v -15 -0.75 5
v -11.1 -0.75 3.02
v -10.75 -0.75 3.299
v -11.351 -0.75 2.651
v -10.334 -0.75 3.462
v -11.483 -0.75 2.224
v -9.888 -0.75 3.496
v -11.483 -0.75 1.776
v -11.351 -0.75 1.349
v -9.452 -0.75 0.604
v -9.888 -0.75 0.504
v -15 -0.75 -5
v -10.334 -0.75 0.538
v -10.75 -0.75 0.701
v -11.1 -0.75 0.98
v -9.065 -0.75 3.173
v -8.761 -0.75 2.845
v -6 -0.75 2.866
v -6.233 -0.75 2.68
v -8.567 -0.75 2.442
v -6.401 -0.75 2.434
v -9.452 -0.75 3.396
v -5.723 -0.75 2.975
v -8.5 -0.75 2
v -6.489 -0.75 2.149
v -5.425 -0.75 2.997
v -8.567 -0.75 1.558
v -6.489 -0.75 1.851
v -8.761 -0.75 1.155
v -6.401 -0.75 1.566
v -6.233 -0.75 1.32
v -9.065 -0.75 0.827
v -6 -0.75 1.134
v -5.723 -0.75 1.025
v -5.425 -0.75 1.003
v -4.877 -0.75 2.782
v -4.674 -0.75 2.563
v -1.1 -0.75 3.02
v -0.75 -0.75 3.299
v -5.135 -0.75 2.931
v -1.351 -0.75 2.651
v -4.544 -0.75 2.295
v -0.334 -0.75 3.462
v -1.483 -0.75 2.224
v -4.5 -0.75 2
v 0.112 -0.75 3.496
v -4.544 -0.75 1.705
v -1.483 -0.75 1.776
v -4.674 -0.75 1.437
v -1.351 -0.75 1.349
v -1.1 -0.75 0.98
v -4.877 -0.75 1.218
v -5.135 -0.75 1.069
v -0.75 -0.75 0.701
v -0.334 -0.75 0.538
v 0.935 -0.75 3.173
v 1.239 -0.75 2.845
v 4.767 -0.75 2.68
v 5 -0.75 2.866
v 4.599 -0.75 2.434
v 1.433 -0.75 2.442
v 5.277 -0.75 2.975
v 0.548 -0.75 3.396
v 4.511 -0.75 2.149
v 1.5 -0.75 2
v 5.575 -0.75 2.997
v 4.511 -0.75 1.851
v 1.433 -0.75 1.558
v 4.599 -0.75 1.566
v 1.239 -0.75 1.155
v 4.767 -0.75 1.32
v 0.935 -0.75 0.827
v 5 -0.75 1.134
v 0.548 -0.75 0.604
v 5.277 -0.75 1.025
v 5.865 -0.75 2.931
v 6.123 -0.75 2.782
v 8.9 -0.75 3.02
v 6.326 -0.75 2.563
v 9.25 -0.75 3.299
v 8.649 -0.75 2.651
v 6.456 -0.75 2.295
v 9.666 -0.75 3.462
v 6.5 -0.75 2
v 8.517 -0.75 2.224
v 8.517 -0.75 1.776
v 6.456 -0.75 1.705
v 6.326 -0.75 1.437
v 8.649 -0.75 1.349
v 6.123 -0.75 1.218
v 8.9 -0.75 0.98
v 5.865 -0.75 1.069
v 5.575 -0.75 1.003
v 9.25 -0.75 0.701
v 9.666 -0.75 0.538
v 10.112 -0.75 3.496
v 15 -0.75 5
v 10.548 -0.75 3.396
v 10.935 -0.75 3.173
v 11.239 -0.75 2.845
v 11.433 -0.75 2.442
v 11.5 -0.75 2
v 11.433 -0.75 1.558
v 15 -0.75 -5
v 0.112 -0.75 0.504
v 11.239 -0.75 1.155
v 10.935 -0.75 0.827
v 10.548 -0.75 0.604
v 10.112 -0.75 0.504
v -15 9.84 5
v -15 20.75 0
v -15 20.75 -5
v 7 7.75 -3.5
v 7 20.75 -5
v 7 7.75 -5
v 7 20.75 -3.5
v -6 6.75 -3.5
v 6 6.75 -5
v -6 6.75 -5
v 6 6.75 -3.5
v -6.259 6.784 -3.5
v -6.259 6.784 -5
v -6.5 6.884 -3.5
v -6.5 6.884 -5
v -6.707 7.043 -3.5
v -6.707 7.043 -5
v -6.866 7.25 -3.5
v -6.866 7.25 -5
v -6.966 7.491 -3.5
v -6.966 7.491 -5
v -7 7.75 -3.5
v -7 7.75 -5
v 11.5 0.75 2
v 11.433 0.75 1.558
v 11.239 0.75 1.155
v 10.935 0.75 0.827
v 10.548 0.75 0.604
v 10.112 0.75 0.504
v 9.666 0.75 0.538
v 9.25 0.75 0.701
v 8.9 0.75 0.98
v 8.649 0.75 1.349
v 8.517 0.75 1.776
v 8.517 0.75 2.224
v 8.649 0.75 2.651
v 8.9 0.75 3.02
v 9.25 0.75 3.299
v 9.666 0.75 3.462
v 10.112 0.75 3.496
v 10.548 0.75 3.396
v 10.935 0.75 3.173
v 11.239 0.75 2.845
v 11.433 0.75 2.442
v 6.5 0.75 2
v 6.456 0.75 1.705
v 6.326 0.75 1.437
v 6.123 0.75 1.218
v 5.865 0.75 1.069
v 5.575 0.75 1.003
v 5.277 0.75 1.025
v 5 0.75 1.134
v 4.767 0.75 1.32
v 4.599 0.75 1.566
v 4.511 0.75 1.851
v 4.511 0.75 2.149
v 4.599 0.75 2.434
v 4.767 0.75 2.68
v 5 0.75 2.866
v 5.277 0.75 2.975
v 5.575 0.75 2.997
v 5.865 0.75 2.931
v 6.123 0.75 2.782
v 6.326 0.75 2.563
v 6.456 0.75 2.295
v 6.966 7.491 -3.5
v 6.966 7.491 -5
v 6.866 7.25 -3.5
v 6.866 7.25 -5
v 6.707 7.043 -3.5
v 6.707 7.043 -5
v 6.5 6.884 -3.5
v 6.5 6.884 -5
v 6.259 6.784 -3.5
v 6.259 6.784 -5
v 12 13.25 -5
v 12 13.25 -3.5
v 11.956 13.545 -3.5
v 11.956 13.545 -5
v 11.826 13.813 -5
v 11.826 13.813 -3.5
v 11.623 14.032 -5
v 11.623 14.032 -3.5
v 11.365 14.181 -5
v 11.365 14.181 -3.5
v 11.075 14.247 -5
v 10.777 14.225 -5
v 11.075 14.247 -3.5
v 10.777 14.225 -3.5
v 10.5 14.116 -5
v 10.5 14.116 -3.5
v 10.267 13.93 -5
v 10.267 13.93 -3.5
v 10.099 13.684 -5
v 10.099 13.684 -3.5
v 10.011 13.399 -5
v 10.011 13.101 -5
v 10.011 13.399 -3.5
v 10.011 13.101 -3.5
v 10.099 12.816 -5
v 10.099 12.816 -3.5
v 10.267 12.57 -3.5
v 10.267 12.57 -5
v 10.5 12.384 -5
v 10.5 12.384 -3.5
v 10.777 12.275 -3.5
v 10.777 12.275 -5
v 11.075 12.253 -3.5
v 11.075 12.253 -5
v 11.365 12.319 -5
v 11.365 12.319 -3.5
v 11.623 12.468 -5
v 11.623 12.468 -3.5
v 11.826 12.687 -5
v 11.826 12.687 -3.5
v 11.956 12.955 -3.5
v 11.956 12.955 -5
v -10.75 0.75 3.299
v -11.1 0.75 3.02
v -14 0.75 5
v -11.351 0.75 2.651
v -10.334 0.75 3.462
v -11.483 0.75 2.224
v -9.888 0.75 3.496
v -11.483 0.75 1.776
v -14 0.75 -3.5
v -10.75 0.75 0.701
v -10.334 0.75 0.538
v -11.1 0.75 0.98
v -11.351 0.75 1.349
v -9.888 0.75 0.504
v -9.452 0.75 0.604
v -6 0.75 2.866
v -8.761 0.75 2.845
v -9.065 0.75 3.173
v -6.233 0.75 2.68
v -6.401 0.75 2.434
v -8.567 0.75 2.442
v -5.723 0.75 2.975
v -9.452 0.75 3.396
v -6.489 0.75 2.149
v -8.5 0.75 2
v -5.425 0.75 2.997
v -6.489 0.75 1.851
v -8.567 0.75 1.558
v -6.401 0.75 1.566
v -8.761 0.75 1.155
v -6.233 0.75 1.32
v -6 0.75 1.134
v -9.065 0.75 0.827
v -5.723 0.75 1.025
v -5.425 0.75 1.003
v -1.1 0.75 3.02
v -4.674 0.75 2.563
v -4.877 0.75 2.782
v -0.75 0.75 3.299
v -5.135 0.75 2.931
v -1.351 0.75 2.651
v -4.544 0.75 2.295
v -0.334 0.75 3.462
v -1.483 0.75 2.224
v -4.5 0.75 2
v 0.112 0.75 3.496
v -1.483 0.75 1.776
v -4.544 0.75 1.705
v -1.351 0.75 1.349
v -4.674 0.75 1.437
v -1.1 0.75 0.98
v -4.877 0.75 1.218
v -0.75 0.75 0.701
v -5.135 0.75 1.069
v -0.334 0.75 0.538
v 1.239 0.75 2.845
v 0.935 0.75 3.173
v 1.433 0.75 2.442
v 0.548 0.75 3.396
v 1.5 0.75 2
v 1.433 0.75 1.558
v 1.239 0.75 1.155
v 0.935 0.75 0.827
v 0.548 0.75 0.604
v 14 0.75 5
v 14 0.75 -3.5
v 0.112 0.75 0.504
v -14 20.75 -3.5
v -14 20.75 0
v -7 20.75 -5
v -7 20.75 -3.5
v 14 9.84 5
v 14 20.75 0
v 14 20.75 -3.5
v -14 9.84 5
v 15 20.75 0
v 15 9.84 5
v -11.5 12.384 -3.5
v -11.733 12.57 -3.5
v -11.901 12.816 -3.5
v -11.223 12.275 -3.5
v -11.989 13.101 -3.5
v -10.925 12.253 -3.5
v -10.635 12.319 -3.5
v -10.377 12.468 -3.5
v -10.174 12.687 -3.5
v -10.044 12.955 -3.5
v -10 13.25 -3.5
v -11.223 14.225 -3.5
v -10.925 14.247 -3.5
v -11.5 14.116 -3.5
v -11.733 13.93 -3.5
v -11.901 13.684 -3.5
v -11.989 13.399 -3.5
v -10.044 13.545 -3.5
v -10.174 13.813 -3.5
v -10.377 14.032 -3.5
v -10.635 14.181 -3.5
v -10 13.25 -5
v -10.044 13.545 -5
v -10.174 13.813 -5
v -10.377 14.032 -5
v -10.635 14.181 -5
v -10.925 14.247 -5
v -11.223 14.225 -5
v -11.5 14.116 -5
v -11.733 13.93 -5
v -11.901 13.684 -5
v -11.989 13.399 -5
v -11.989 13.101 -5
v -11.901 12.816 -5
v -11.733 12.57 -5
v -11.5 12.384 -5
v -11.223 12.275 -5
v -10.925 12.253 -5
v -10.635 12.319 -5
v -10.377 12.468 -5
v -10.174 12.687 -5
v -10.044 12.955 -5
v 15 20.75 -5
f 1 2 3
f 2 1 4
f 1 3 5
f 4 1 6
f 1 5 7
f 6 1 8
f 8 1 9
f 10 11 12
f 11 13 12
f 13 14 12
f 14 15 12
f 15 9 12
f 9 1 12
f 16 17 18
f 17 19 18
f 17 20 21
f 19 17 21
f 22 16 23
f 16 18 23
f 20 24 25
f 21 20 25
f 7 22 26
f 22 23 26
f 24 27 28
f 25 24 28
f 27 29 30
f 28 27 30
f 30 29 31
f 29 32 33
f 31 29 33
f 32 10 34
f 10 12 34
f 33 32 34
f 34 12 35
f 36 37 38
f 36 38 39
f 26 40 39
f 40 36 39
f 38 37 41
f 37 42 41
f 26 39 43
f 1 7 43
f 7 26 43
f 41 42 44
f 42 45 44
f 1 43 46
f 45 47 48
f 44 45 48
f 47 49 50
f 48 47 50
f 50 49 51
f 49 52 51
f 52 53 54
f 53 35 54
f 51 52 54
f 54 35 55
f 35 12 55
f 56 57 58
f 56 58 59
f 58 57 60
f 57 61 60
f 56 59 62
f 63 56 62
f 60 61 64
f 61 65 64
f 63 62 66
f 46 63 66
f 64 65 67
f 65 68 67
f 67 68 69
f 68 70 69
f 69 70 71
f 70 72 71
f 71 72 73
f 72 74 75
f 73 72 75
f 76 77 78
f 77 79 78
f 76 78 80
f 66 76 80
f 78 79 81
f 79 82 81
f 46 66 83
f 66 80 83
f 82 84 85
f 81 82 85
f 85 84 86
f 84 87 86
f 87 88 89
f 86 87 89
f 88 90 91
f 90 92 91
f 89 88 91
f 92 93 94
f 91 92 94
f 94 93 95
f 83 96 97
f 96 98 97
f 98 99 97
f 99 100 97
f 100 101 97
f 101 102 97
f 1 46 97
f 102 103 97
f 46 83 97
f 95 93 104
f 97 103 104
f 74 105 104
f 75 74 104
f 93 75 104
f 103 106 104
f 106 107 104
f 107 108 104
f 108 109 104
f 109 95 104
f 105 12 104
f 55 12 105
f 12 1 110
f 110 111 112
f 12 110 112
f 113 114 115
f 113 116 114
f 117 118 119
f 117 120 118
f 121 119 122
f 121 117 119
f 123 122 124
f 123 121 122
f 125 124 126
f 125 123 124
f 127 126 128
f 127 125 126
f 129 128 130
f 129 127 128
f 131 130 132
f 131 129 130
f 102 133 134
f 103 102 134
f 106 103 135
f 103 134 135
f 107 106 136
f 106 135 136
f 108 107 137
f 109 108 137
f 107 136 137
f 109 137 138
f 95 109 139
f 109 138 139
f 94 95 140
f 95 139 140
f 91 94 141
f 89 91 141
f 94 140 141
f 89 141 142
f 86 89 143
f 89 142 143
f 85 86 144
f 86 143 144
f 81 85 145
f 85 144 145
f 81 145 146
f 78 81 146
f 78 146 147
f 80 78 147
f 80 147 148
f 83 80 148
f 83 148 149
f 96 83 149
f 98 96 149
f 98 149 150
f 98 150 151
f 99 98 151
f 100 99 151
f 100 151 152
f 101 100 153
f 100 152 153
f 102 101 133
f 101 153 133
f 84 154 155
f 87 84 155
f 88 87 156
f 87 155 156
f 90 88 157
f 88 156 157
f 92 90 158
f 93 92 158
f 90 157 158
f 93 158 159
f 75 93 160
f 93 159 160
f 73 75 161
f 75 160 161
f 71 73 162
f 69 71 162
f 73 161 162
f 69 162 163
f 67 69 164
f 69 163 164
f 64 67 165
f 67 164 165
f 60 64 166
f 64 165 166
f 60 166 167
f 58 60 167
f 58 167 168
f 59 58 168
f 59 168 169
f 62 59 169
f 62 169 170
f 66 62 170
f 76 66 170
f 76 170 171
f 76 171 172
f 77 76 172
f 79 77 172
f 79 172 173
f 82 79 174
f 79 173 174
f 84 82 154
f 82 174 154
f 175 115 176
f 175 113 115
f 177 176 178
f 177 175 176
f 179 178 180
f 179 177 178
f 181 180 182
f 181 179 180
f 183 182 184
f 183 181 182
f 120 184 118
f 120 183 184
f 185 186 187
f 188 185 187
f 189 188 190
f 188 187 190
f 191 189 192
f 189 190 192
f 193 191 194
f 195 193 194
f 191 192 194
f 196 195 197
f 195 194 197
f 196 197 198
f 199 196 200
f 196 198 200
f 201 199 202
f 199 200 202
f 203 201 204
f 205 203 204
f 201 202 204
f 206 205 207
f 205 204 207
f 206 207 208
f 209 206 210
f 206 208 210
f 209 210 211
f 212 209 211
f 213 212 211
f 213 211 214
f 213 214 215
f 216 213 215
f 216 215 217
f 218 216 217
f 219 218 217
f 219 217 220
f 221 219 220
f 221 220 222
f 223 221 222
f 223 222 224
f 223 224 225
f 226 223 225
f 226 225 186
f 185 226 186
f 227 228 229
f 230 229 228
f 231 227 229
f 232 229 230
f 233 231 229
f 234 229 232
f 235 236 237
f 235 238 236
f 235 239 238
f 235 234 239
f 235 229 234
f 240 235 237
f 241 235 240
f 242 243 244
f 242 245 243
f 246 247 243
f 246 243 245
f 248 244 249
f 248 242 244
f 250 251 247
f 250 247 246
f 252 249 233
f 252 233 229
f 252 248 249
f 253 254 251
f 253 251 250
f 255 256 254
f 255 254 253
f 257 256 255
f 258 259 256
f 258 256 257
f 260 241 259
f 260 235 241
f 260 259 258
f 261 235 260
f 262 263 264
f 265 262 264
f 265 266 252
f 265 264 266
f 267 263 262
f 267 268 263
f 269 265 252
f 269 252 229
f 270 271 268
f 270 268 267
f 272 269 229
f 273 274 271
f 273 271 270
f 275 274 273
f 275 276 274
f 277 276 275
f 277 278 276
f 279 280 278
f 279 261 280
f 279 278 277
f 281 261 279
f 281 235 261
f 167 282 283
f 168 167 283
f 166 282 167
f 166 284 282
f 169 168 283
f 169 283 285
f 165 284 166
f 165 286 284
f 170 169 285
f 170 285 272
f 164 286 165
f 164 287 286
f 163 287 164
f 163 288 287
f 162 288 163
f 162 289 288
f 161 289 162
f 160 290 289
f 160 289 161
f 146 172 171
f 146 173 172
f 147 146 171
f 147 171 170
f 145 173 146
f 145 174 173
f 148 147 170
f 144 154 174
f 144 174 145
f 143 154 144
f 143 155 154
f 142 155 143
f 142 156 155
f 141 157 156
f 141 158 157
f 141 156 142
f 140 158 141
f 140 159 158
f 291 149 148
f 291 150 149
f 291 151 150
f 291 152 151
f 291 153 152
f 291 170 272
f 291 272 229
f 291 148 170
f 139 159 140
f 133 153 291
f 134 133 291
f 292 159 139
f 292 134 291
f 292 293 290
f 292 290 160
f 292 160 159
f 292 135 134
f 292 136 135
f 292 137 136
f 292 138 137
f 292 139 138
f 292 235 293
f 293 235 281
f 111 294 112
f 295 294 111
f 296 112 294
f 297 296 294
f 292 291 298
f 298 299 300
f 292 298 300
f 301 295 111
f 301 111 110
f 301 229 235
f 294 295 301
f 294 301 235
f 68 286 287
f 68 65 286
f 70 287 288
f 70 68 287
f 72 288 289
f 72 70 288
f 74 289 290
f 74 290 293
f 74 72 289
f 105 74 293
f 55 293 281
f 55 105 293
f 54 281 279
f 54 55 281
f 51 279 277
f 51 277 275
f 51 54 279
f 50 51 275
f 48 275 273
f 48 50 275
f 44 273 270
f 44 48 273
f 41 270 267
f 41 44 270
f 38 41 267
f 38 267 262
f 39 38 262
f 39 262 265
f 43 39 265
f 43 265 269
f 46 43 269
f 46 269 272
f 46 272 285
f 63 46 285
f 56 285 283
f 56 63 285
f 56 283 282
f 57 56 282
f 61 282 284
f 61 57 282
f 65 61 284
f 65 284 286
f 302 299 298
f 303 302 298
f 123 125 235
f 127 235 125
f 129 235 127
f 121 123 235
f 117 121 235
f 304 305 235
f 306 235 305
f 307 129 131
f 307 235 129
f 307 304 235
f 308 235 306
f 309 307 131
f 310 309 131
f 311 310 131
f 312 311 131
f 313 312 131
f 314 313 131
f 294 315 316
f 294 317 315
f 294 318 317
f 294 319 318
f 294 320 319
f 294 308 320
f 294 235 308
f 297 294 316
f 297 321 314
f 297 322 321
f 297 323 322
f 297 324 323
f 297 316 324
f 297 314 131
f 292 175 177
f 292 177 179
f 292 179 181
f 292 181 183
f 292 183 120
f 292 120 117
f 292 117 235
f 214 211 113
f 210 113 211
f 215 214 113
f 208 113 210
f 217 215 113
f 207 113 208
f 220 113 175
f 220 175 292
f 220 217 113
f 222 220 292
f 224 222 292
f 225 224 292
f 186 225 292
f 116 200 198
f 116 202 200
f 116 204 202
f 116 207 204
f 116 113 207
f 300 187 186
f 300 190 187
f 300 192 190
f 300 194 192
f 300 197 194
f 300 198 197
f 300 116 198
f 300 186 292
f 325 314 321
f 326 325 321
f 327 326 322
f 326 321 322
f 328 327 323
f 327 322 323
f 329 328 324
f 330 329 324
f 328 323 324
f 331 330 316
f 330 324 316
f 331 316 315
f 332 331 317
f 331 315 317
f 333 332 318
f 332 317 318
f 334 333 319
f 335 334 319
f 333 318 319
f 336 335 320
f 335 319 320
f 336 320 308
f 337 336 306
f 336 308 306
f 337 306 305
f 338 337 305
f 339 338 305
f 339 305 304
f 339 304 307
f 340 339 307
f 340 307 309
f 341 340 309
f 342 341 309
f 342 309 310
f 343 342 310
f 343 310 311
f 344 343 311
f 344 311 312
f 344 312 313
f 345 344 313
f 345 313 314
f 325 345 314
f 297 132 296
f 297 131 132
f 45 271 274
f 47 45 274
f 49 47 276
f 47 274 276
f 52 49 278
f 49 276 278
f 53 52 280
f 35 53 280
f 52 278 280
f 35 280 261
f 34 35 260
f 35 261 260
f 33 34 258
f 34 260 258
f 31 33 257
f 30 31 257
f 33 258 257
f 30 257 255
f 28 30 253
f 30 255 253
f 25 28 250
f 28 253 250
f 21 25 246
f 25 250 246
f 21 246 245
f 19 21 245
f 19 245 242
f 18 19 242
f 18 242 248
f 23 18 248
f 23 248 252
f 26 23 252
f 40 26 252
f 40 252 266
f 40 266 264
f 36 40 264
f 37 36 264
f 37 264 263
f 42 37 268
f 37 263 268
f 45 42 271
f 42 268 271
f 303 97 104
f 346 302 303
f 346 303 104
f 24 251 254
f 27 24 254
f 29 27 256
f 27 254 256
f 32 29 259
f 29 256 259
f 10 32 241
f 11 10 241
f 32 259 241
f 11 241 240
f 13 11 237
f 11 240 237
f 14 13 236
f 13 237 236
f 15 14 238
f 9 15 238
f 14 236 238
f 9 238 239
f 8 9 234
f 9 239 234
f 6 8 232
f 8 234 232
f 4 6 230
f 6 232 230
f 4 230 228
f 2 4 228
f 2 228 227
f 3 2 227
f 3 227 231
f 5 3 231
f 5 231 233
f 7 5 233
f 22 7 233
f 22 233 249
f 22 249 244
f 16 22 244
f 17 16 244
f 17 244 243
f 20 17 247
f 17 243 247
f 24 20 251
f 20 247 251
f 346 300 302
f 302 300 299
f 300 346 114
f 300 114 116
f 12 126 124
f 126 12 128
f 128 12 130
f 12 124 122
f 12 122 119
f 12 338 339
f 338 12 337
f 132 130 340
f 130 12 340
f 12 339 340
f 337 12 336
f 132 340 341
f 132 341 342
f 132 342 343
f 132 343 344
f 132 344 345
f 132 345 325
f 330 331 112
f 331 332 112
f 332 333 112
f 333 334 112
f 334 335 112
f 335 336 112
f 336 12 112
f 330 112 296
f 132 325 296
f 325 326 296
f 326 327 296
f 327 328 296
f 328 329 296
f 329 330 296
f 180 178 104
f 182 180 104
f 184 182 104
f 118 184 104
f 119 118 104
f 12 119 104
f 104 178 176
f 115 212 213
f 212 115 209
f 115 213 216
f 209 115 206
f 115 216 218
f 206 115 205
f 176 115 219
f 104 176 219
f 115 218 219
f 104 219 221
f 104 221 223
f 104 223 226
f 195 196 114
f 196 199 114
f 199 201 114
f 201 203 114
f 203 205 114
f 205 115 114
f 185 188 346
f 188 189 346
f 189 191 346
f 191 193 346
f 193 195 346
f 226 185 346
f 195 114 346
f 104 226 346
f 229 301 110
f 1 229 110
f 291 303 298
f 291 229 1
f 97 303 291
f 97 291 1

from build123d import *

# Parameters (mm, degrees)
SKETCH1_W           = 30
SKETCH1_H           = 10
SKETCH1_R           = 1.5
BOSS_EXTRUDE1_DEPTH = 0.75
SKETCH2_R           = 1.5
SKETCH2_R_2         = 1
CUT_EXTRUDE1_DEPTH  = 1.5
BOSS_EXTRUDE3_START = -4.25
BOSS_EXTRUDE3_DEPTH = 0.75
SKETCH4_R           = 1
CUT_EXTRUDE2_DEPTH  = 10
FILLET1_R           = 1
BOSS_EXTRUDE4_START = 14
BOSS_EXTRUDE4_DEPTH = 1


with BuildPart() as part:
    # Sketch1 → Boss-Extrude1 (new body, symmetric)
    with BuildSketch(Plane(origin=(0, 0, 0), x_dir=(1, 0, 0), z_dir=(0, 1, 0))):
        Rectangle(SKETCH1_W, SKETCH1_H)
        with Locations((0, -2)):
            Circle(SKETCH1_R, mode=Mode.SUBTRACT)
    extrude(amount=BOSS_EXTRUDE1_DEPTH, both=True)

    # Sketch2 → Cut-Extrude1 (cut)
    with BuildSketch(Plane(origin=(0, 0.75, 0), x_dir=(1, 0, 0), z_dir=(0, 1, 0))):
        with Locations((-10, -2)):
            Circle(SKETCH2_R)
        with Locations((10, -2)):
            Circle(SKETCH2_R)
        with Locations((-5.5, -2)):
            Circle(SKETCH2_R_2)
        with Locations((5.5, -2)):
            Circle(SKETCH2_R_2)
    extrude(amount=-CUT_EXTRUDE1_DEPTH, mode=Mode.SUBTRACT)

    # Sketch3 → Boss-Extrude3 (add, symmetric)
    with BuildSketch(Plane.XY.offset(BOSS_EXTRUDE3_START)):
        Polygon((15, 0.75), (15, 20.75), (7, 20.75), (7, 6.75), (-7, 6.75), (-7, 20.75), (-15, 20.75), (-15, 0.75), align=None)
    extrude(amount=BOSS_EXTRUDE3_DEPTH, both=True)

    # Sketch4 → Cut-Extrude2 (cut)
    with BuildSketch(Plane.XY):
        with Locations((-11, 13.25)):
            Circle(SKETCH4_R)
        with Locations((11, 13.25)):
            Circle(SKETCH4_R)
    extrude(amount=-CUT_EXTRUDE2_DEPTH, mode=Mode.SUBTRACT)

    # Fillet1
    fillet1_edges = [part.edges().sort_by_distance(p)[0] for p in [
        (7, 6.75, -4.25),
        (-7, 6.75, -4.25),
    ]]
    fillet(fillet1_edges, radius=FILLET1_R)

    # Sketch7 → Boss-Extrude4 (add)
    with BuildSketch(Plane(origin=(0, 0, 0), x_dir=(0, 0, -1), z_dir=(1, 0, 0)).offset(BOSS_EXTRUDE4_START)):
        Polygon((3.5, 0.75), (3.5, 20.75), (0, 20.75), (-5, 9.840050856), (-5, 0.75), align=None)
    boss_extrude4 = extrude(amount=BOSS_EXTRUDE4_DEPTH)

    # Mirror1: Boss-Extrude4 across plane
    add(boss_extrude4.mirror(Plane(origin=(0, 0, 0), x_dir=(0, 0, 1), z_dir=(1, 0, 0))))


solid = part.part
